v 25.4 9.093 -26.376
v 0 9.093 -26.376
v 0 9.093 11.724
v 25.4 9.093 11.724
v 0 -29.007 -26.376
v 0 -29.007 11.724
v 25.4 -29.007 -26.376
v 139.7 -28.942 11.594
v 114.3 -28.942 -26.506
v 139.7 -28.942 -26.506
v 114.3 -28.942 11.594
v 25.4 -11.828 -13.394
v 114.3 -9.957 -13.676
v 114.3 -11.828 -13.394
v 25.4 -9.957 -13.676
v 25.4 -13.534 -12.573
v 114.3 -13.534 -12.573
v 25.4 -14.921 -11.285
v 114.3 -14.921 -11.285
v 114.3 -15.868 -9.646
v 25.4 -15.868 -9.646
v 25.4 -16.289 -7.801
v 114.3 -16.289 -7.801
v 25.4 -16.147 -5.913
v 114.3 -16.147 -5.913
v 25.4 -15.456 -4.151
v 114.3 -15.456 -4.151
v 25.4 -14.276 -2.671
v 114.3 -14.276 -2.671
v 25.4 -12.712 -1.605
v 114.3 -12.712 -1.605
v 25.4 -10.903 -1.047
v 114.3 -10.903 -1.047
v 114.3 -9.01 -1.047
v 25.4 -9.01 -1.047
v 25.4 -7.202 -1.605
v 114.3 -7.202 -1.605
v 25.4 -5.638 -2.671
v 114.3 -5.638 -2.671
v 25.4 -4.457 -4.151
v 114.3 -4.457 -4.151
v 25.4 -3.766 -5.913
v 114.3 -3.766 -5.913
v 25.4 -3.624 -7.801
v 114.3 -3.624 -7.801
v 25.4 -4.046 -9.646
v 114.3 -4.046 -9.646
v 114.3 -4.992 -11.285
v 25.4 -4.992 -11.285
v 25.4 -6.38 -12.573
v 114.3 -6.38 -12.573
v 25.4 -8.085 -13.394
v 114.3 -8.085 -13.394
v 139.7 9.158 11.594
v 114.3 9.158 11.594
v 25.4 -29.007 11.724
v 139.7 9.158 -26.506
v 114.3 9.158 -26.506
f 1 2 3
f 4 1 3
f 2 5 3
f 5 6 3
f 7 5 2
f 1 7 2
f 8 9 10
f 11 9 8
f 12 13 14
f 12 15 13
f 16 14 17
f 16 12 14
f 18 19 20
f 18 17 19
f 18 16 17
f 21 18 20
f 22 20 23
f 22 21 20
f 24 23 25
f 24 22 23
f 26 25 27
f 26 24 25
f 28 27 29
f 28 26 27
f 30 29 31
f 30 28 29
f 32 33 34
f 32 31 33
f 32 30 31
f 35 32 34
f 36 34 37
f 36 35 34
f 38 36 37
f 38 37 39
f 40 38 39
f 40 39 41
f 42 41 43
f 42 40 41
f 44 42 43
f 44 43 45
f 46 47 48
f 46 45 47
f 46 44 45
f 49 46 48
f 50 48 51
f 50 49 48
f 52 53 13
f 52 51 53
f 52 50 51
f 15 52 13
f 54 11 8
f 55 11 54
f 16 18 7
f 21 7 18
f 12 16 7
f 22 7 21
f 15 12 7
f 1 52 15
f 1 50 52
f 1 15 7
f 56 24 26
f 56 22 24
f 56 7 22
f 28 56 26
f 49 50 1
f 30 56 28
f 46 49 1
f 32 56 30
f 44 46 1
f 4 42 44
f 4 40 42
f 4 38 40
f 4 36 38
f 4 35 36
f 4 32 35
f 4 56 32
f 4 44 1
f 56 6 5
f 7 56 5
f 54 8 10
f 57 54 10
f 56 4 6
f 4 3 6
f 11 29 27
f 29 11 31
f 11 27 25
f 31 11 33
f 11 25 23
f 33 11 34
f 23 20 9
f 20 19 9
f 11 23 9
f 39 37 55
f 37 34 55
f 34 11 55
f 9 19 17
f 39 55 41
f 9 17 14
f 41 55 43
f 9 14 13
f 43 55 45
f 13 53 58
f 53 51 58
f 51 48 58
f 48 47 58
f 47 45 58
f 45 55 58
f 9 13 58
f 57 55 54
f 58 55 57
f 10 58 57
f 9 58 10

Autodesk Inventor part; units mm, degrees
ref_plane "YZ Plane" through (0, 0, 0) normal (1, 0, 0) x (0, 1, 0)
ref_plane "XZ Plane" through (0, 0, 0) normal (0, 1, 0) x (-1, 0, 0)
ref_plane "XY Plane" through (0, 0, 0) normal (0, 0, 1) x (1, 0, 0)
sketch "Sketch1" plane through (0, 0, 0) normal (1, 0, 0) x (0, 1, 0)
  line L0 (9.0933, 11.7239) -> (-29.0067, 11.7239)
  line L1 (-29.0067, 11.7239) -> (-29.0067, -26.3761)
  line L2 (-29.0067, -26.3761) -> (9.0933, -26.3761)
  line L3 (9.0933, -26.3761) -> (9.0933, 11.7239)
  circle A0 centre (-9.9567, -7.3261) radius 6.35
  point P0 (0, 0)
  dimension "d0" = 38.1
  dimension "d1" = 38.1
  dimension "d2" = 12.7
  dimension "d3" = 19.05
  dimension "d4" = 19.05
extrude "Extrusion1" add sketch "Sketch1" along normal blind 25.4 contours L3 L2 L1 L0 | A0
sketch "Sketch2" plane through (25.4, 0, 0) normal (1, 0, 0) x (0, 0, -1)
  circle A0 centre (7.3261, -9.9567) radius 6.35
  line L0 (-11.7239, 9.0933) -> (-11.7239, -29.0067) projected
  line L1 (26.3761, 9.0933) -> (-11.7239, 9.0933) projected
  point P0 (0, 0)
  dimension "d7" = 12.7
  dimension "d8" = 19.05
  dimension "d9" = 19.05
extrude "Extrusion2" add sketch "Sketch2" along normal blind 88.9
sketch "Sketch3" plane through (114.3, -9.9567, -7.3261) normal (1, 0, 0) x (0, 0, -1)
  line L0 (-18.9201, 19.115) -> (19.1799, 19.115)
  line L1 (19.1799, 19.115) -> (19.1799, -18.985)
  line L2 (19.1799, -18.985) -> (-18.9201, -18.985)
  line L3 (-18.9201, -18.985) -> (-18.9201, 19.115)
  point P0 (-7.3261, 9.9567)
  dimension "d12" = 38.1
  dimension "d13" = 38.1
extrude "Extrusion3" add sketch "Sketch3" along normal blind 25.4
properties part number "belt axle"
